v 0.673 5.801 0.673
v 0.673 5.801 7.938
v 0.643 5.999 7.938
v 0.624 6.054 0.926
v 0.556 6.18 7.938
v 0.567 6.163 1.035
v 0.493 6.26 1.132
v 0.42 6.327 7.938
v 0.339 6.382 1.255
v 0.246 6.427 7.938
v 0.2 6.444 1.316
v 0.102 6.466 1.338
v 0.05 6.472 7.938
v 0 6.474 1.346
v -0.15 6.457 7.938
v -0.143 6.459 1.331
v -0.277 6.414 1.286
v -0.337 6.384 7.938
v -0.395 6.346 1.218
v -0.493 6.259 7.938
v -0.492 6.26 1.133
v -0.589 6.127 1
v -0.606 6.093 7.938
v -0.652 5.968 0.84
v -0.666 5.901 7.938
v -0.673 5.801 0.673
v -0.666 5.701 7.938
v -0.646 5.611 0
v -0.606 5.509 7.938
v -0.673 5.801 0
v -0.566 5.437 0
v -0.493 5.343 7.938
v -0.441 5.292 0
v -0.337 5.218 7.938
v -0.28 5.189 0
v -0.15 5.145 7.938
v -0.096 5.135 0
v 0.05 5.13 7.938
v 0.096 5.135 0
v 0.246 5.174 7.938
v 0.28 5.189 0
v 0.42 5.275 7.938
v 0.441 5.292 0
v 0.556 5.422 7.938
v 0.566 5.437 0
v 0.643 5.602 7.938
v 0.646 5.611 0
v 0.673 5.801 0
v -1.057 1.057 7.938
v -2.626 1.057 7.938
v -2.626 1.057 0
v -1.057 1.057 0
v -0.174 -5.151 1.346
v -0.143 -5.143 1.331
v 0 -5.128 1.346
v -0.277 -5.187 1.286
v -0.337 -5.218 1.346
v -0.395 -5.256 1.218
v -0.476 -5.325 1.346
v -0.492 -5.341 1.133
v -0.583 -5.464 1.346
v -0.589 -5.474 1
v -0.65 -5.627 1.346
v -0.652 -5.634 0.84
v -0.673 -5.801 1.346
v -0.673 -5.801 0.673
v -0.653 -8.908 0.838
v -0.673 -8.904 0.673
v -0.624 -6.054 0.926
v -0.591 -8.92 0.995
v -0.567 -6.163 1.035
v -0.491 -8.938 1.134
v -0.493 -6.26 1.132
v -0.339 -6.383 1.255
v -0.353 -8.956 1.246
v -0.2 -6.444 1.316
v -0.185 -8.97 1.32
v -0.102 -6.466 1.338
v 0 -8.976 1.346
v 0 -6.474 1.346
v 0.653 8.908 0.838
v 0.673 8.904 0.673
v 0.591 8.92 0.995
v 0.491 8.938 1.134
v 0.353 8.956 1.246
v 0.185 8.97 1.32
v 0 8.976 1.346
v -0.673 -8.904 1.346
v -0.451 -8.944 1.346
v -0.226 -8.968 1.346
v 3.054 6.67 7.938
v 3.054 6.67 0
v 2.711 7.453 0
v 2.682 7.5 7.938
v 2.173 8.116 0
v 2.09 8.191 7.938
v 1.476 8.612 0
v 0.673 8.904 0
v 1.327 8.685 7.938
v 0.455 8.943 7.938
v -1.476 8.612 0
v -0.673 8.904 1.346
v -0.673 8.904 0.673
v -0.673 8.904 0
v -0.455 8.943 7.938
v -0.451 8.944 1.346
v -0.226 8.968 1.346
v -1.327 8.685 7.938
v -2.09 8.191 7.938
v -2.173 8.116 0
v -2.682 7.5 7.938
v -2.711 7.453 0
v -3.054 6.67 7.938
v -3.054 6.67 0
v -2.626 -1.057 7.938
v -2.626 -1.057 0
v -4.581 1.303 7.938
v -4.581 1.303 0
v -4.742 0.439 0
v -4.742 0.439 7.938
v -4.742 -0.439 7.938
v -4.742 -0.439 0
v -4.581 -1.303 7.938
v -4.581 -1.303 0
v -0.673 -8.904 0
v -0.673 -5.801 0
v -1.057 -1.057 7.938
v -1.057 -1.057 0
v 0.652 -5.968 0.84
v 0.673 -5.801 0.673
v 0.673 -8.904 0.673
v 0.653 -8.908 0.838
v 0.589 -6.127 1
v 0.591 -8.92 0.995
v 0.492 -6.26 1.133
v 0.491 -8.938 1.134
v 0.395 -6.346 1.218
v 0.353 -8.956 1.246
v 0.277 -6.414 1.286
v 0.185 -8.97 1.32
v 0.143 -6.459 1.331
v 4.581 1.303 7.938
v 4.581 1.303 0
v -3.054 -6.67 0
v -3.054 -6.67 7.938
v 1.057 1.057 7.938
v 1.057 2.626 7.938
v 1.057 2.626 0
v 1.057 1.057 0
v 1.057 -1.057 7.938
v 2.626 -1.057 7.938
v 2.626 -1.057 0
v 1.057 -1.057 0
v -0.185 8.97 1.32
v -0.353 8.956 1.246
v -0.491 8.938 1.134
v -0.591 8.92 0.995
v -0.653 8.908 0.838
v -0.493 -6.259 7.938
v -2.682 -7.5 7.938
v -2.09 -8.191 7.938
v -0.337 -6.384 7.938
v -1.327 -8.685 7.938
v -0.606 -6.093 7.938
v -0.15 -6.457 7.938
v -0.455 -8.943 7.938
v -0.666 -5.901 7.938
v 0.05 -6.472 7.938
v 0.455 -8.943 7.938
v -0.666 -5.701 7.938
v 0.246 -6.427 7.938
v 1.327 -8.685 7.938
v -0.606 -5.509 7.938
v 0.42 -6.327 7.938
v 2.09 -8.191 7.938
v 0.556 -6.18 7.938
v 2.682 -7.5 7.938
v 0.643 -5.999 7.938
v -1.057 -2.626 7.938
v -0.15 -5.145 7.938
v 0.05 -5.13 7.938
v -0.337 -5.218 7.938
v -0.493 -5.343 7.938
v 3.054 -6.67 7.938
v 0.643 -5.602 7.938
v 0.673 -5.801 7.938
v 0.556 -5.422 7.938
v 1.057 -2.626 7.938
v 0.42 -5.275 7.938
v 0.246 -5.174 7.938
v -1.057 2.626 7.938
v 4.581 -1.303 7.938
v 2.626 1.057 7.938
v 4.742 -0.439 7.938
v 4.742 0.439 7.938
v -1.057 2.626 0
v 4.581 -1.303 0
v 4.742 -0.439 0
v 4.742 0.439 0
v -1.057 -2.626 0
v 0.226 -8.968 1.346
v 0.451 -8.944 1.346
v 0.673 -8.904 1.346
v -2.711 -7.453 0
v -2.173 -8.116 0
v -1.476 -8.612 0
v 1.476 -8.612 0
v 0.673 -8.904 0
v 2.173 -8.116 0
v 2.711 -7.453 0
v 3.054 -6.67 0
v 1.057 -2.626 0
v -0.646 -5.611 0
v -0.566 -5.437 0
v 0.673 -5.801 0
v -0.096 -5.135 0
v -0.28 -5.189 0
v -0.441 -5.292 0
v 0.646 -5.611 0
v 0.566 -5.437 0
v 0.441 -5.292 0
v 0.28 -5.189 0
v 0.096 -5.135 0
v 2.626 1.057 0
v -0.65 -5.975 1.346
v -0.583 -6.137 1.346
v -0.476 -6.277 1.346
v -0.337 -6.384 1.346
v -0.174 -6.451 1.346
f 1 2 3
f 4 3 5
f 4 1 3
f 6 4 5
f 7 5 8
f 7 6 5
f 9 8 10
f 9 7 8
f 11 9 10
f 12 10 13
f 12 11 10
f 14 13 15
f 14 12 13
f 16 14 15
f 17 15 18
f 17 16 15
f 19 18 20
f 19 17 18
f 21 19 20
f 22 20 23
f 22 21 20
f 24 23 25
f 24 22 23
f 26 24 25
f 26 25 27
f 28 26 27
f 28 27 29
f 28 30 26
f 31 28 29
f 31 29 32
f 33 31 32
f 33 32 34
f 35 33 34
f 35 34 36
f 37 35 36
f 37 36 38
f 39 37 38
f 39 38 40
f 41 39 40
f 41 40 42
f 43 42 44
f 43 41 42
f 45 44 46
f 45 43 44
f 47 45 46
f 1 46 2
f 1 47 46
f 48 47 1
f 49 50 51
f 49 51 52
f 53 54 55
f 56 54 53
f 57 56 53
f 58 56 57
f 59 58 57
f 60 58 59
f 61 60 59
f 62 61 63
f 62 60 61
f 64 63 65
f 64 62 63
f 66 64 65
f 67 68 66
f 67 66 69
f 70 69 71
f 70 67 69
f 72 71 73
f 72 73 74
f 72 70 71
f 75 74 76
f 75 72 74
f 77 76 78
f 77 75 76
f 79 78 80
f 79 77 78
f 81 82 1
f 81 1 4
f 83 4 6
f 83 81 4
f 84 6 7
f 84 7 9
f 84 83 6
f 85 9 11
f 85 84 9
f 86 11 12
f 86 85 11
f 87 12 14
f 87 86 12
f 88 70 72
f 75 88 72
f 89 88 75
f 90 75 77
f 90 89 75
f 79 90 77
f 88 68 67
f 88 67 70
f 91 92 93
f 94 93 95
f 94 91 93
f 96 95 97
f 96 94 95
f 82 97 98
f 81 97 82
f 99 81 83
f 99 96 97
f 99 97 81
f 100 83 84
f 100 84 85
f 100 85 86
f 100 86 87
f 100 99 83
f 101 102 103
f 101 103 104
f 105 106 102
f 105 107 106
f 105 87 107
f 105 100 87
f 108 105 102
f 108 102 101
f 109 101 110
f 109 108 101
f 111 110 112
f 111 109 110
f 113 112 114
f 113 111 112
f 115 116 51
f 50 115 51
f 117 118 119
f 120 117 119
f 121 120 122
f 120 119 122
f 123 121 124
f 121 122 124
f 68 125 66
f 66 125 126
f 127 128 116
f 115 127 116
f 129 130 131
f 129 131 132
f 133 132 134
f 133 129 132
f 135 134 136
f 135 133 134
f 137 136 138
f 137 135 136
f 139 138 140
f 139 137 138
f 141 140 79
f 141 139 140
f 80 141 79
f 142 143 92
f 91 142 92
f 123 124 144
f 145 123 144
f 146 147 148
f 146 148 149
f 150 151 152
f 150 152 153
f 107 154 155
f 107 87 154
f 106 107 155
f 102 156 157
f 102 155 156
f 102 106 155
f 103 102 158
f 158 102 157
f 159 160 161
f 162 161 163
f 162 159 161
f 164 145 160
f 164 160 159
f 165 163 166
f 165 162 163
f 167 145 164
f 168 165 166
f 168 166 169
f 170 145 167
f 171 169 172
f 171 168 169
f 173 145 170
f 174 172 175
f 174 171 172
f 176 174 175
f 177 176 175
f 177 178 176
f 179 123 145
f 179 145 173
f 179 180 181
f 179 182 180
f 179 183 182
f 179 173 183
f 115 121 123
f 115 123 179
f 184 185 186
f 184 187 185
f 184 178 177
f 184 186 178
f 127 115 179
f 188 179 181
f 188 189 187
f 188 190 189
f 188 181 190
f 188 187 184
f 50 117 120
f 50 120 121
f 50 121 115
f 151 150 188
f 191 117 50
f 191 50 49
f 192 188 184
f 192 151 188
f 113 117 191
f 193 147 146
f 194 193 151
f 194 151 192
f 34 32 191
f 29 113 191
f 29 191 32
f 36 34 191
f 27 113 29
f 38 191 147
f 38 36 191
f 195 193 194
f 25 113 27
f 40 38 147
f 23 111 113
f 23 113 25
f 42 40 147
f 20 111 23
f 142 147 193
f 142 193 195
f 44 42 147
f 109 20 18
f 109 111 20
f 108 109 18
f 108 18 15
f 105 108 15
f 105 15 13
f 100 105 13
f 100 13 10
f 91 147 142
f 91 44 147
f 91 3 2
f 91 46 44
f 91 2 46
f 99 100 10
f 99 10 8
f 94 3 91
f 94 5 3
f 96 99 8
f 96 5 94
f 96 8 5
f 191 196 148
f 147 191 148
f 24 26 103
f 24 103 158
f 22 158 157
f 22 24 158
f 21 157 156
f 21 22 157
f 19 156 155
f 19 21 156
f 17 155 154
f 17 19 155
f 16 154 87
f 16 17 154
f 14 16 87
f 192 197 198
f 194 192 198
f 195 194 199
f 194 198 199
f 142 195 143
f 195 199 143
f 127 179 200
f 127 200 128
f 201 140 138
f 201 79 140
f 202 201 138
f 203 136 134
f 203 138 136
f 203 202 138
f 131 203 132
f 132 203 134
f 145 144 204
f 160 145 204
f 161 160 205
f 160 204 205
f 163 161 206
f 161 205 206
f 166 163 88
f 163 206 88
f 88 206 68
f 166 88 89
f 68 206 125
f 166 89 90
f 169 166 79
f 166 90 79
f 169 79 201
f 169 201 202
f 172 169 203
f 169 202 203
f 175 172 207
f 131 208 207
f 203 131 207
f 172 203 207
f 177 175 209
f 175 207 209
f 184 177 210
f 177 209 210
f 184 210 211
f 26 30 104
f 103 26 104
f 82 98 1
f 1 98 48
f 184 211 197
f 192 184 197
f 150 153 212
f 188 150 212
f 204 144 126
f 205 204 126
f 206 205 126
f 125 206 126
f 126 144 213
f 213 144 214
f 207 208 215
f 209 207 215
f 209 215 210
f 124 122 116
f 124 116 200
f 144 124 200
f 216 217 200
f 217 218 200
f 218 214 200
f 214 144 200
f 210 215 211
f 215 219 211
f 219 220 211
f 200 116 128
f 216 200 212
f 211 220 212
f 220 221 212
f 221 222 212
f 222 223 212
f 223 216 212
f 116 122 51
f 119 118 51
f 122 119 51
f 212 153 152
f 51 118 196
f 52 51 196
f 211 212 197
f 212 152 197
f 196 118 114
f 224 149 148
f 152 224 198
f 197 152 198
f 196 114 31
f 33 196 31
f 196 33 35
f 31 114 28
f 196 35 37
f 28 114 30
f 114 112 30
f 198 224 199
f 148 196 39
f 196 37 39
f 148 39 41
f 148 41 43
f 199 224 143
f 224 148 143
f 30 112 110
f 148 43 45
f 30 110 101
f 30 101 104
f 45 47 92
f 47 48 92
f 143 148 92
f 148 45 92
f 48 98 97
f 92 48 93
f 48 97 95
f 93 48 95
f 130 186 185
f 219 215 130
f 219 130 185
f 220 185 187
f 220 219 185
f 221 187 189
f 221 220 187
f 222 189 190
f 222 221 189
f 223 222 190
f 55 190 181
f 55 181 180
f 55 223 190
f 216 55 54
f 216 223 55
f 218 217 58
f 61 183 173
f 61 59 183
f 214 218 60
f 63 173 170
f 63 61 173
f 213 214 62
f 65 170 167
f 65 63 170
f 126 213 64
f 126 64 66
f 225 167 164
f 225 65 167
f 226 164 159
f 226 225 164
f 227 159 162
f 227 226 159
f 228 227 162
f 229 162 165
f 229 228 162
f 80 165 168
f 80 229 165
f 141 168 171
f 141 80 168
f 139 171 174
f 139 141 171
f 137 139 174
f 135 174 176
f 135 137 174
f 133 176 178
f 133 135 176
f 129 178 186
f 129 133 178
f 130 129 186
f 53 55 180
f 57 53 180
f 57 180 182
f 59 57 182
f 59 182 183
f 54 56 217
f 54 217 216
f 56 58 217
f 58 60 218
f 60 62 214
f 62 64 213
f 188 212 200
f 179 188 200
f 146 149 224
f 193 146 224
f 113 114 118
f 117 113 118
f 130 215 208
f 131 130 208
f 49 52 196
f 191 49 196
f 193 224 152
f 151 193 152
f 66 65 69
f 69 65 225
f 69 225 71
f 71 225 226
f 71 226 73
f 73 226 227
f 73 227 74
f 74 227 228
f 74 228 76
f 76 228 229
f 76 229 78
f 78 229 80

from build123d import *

# Parameters (mm, degrees)
F0_R         = 0.6731
F1_DEPTH     = 7.9375
F3_DEPTH     = 1.3462
F4_T4_DEPTH  = 6.4683311894
F4_S5_R      = 3.175
F4_T6_DEPTH  = 5
F4_S7_R      = 0.6731
F4_T8_DEPTH  = 5
F4_T12_DEPTH = 6.4683311894
F4_S13_R     = 3.175
F4_T14_DEPTH = 5
F4_S15_R     = 0.6731
F4_T16_DEPTH = 5
F4_T20_DEPTH = 6.4683311894
F4_S21_R     = 3.175
F4_T22_DEPTH = 5
F4_S23_R     = 0.6731
F4_T24_DEPTH = 5
F4_T28_DEPTH = 6.4683311894
F4_S29_R     = 3.175
F4_T30_DEPTH = 5
F4_S31_R     = 0.6731
F4_T32_DEPTH = 5


# Not quite as in the source:
# - a fillet or chamfer that OpenCascade refuses, or shapes differently, is made with other operations: its cross-section is extruded or revolved along the edge and cut away or added


with BuildPart() as f1:
    # F0 (on Top) → F1 (new body)
    with BuildSketch(Plane.XY):
        with BuildLine():
            ThreePointArc((-4.5806904159, 1.3033347856), (-4.7625, 0), (-4.5806904159, -1.3033347856))
            Line((-4.5806904159, -1.3033347856), (-3.0537936106, -6.6697545571))
            ThreePointArc((-3.0537936106, -6.6697545571), (0, -8.9758647), (3.0537936106, -6.6697545571))
            Line((3.0537936106, -6.6697545571), (4.5806904159, -1.3033347856))
            ThreePointArc((4.5806904159, -1.3033347856), (4.7625, 0), (4.5806904159, 1.3033347856))
            Line((4.5806904159, 1.3033347856), (3.0537936106, 6.6697545571))
            ThreePointArc((3.0537936106, 6.6697545571), (0, 8.9758647), (-3.0537936106, 6.6697545571))
            Line((-3.0537936106, 6.6697545571), (-4.5806904159, 1.3033347856))
        make_face()
        with Locations((0, -5.8008647)):
            Circle(F0_R, mode=Mode.SUBTRACT)
        Polygon((-1.0574147, 2.6258647), (1.0574147, 2.6258647), (1.0574147, 1.0574147), (2.6258647, 1.0574147), (2.6258647, -1.0574147), (1.0574147, -1.0574147), (1.0574147, -2.6258647), (-1.0574147, -2.6258647), (-1.0574147, -1.0574147), (-2.6258647, -1.0574147), (-2.6258647, 1.0574147), (-1.0574147, 1.0574147), align=None, mode=Mode.SUBTRACT)
        with Locations((0, 5.8008647)):
            Circle(F0_R, mode=Mode.SUBTRACT)
    extrude(amount=F1_DEPTH)

    # F2 (on face) → F3 (cut)
    with BuildSketch(Plane(origin=(0, 0, 0), x_dir=(1, 0, 0), z_dir=(0, 0, -1))):
        with BuildLine():
            Line((-0.6731, 5.8008647), (0.6731, 5.8008647))
            Line((0.6731, 5.8008647), (0.6731, 8.9036958894))
            ThreePointArc((0.6731, 8.9036958894), (0, 8.9758647), (-0.6731, 8.9036958894))
            Line((-0.6731, 8.9036958894), (-0.6731, 5.8008647))
        make_face()
        with BuildLine():
            Line((0.6731, -8.9036958894), (0.6731, -5.8008647))
            Line((0.6731, -5.8008647), (-0.6731, -5.8008647))
            Line((-0.6731, -5.8008647), (-0.6731, -8.9036958894))
            ThreePointArc((-0.6731, -8.9036958894), (0, -8.9758647), (0.6731, -8.9036958894))
        make_face()
    extrude(amount=-F3_DEPTH, mode=Mode.SUBTRACT)

    # F4: fillet of radius 0.6731 on 4 edges, made by hand


with BuildPart() as f4_tool2:
    # F4_s3 → F4_t4 (new body)
    with BuildSketch(Plane.XZ.offset(-10.5864458894)):
        with BuildLine():
            ThreePointArc((0.6731, 0.6731), (0.4759535744, 1.1490535744), (0, 1.3462))
            Line((0, 1.3462), (0.6731, 1.3462))
            Line((0.6731, 1.3462), (0.6731, 0.6731))
        make_face()
    extrude(amount=F4_T4_DEPTH)

    # F4_s5 → F4_t6 (intersect, symmetric)
    with BuildSketch(Plane.XY.offset(1)):
        with Locations((0, 5.8008647)):
            Circle(F4_S5_R)
    extrude(amount=F4_T6_DEPTH, both=True, mode=Mode.INTERSECT)

    # F4_s7 → F4_t8 (cut, symmetric)
    with BuildSketch(Plane.XY.offset(1)):
        with Locations((0, 5.8008647)):
            Circle(F4_S7_R)
    extrude(amount=F4_T8_DEPTH, both=True, mode=Mode.SUBTRACT)


with BuildPart() as f1_1:
    add(f1.part)

    # F4_t1: union F4_tool2
    add(f4_tool2.part)


with BuildPart() as f4_tool10:
    # F4_s11 → F4_t12 (new body)
    with BuildSketch(Plane.XZ.offset(-4.1181147)):
        with BuildLine():
            ThreePointArc((-0.6731, 0.6731), (-0.4759535744, 1.1490535744), (0, 1.3462))
            Line((0, 1.3462), (-0.6731, 1.3462))
            Line((-0.6731, 1.3462), (-0.6731, 0.6731))
        make_face()
    extrude(amount=-F4_T12_DEPTH)

    # F4_s13 → F4_t14 (intersect, symmetric)
    with BuildSketch(Plane.XY.offset(1)):
        with Locations((0, 5.8008647)):
            Circle(F4_S13_R)
    extrude(amount=F4_T14_DEPTH, both=True, mode=Mode.INTERSECT)

    # F4_s15 → F4_t16 (cut, symmetric)
    with BuildSketch(Plane.XY.offset(1)):
        with Locations((0, 5.8008647)):
            Circle(F4_S15_R)
    extrude(amount=F4_T16_DEPTH, both=True, mode=Mode.SUBTRACT)


with BuildPart() as f1_2:
    add(f1_1.part)

    # F4_t9: union F4_tool10
    add(f4_tool10.part)


with BuildPart() as f4_tool18:
    # F4_s19 → F4_t20 (new body)
    with BuildSketch(Plane.XZ.offset(4.1181147)):
        with BuildLine():
            ThreePointArc((0.6731, 0.6731), (0.4759535744, 1.1490535744), (0, 1.3462))
            Line((0, 1.3462), (0.6731, 1.3462))
            Line((0.6731, 1.3462), (0.6731, 0.6731))
        make_face()
    extrude(amount=F4_T20_DEPTH)

    # F4_s21 → F4_t22 (intersect, symmetric)
    with BuildSketch(Plane.XY.offset(1)):
        with Locations((0, -5.8008647)):
            Circle(F4_S21_R)
    extrude(amount=F4_T22_DEPTH, both=True, mode=Mode.INTERSECT)

    # F4_s23 → F4_t24 (cut, symmetric)
    with BuildSketch(Plane.XY.offset(1)):
        with Locations((0, -5.8008647)):
            Circle(F4_S23_R)
    extrude(amount=F4_T24_DEPTH, both=True, mode=Mode.SUBTRACT)


with BuildPart() as f1_3:
    add(f1_2.part)

    # F4_t17: union F4_tool18
    add(f4_tool18.part)


with BuildPart() as f4_tool26:
    # F4_s27 → F4_t28 (new body)
    with BuildSketch(Plane.XZ.offset(10.5864458894)):
        with BuildLine():
            ThreePointArc((-0.6731, 0.6731), (-0.4759535744, 1.1490535744), (0, 1.3462))
            Line((0, 1.3462), (-0.6731, 1.3462))
            Line((-0.6731, 1.3462), (-0.6731, 0.6731))
        make_face()
    extrude(amount=-F4_T28_DEPTH)

    # F4_s29 → F4_t30 (intersect, symmetric)
    with BuildSketch(Plane.XY.offset(1)):
        with Locations((0, -5.8008647)):
            Circle(F4_S29_R)
    extrude(amount=F4_T30_DEPTH, both=True, mode=Mode.INTERSECT)

    # F4_s31 → F4_t32 (cut, symmetric)
    with BuildSketch(Plane.XY.offset(1)):
        with Locations((0, -5.8008647)):
            Circle(F4_S31_R)
    extrude(amount=F4_T32_DEPTH, both=True, mode=Mode.SUBTRACT)


with BuildPart() as f1_4:
    add(f1_3.part)

    # F4_t25: union F4_tool26
    add(f4_tool26.part)


solid = f1_4.part
